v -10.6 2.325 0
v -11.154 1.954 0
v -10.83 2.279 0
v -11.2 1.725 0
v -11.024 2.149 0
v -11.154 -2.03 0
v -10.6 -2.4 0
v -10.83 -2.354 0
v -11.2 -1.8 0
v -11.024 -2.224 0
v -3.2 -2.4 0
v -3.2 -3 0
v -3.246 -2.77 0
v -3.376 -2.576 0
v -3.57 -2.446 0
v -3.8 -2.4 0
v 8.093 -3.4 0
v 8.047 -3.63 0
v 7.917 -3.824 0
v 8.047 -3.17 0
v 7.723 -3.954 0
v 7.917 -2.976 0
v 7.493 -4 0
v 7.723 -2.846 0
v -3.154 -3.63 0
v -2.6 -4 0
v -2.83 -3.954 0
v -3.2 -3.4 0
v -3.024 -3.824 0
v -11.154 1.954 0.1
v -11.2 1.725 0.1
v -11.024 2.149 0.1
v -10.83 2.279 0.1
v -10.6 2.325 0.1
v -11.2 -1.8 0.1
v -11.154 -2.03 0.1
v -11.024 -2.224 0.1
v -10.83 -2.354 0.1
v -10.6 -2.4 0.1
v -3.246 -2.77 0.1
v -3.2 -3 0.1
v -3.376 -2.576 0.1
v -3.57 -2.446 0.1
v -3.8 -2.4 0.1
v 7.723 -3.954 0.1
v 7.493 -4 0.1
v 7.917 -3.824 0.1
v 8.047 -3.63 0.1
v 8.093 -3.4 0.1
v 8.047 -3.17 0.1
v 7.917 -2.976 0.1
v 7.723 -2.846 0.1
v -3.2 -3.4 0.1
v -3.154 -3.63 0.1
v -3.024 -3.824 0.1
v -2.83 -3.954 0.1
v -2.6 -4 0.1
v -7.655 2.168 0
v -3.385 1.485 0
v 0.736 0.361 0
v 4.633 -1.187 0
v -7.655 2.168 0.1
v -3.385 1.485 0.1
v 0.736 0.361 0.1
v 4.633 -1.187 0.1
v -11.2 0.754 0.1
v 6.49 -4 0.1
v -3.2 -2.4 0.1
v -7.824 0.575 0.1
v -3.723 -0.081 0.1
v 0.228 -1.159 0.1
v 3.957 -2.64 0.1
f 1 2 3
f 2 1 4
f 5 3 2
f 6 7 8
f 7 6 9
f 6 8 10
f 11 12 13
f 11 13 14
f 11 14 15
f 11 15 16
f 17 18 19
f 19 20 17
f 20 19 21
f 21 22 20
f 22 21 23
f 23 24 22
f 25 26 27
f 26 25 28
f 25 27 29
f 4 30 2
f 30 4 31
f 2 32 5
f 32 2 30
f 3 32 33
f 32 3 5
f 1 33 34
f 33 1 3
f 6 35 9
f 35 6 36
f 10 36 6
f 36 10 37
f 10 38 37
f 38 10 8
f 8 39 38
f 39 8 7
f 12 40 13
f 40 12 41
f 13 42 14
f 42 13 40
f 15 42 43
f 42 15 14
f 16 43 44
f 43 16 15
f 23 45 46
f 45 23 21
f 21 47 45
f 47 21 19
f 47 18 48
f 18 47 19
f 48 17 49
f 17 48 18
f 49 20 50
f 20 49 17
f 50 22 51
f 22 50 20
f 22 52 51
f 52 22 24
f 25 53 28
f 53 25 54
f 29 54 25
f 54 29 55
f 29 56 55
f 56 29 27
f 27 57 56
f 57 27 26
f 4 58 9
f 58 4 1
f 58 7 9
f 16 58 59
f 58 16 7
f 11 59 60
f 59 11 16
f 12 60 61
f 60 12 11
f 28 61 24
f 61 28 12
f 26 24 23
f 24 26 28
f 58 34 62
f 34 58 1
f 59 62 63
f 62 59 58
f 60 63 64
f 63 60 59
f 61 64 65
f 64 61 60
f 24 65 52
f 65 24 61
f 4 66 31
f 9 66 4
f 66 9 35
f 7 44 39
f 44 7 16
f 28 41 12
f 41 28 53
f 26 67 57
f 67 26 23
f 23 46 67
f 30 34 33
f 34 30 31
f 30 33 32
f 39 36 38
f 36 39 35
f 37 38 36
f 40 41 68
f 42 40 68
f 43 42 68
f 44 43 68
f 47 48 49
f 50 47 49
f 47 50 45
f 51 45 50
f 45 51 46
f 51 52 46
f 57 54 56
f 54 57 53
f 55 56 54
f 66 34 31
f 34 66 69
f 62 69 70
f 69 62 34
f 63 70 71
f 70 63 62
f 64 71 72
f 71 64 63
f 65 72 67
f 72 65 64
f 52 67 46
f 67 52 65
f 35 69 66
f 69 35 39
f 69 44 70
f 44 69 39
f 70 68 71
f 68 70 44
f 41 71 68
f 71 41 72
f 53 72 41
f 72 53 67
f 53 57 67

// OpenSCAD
// file: ../p/7-16cyli.scad
use <../lib.scad>
function ldraw_lib__7_16cyli() = [
// 0 Cylinder 0.4375
// 0 Name: 7-16cyli.dat
// 0 Author: Magnus Forsberg [MagFors]
// 0 !LDRAW_ORG Primitive UPDATE 2024-01
// 0 !LICENSE Licensed under CC BY 4.0 : see CAreadme.txt
// 
// 0 BFC CERTIFY CCW
  [0,"BFC","CERTIFY"],
  [0,"BFC","CCW"],
// 
// 0 !HISTORY 2009-05-02 [PTadmin] Official Update 2009-01
// 0 !HISTORY 2024-01-03 [MagFors] Complete regeneration, original by guyvivan
// 0 !HISTORY 2024-01-29 [OrionP] Official Update 2024-01
// 
// 4 16 0.9239 0 0.3827 1 0 0 1 1 0 0.9239 1 0.3827
  [4,16,0.9239,0,0.3827,1,0,0,1,1,0,0.9239,1,0.3827],
// 4 16 0.7071 0 0.7071 0.9239 0 0.3827 0.9239 1 0.3827 0.7071 1 0.7071
  [4,16,0.7071,0,0.7071,0.9239,0,0.3827,0.9239,1,0.3827,0.7071,1,0.7071],
// 4 16 0.3827 0 0.9239 0.7071 0 0.7071 0.7071 1 0.7071 0.3827 1 0.9239
  [4,16,0.3827,0,0.9239,0.7071,0,0.7071,0.7071,1,0.7071,0.3827,1,0.9239],
// 4 16 0 0 1 0.3827 0 0.9239 0.3827 1 0.9239 0 1 1
  [4,16,0,0,1,0.3827,0,0.9239,0.3827,1,0.9239,0,1,1],
// 4 16 -0.3827 0 0.9239 0 0 1 0 1 1 -0.3827 1 0.9239
  [4,16,-0.3827,0,0.9239,0,0,1,0,1,1,-0.3827,1,0.9239],
// 4 16 -0.7071 0 0.7071 -0.3827 0 0.9239 -0.3827 1 0.9239 -0.7071 1 0.7071
  [4,16,-0.7071,0,0.7071,-0.3827,0,0.9239,-0.3827,1,0.9239,-0.7071,1,0.7071],
// 4 16 -0.9239 0 0.3827 -0.7071 0 0.7071 -0.7071 1 0.7071 -0.9239 1 0.3827
  [4,16,-0.9239,0,0.3827,-0.7071,0,0.7071,-0.7071,1,0.7071,-0.9239,1,0.3827],
// 0 // conditional lines
// 5 24 1 1 0 1 0 0 1 1 -0.4142 0.9239 1 0.3827
  [5,24,1,1,0,1,0,0,1,1,-0.4142,0.9239,1,0.3827],
// 5 24 0.9239 1 0.3827 0.9239 0 0.3827 1 1 0 0.7071 1 0.7071
  [5,24,0.9239,1,0.3827,0.9239,0,0.3827,1,1,0,0.7071,1,0.7071],
// 5 24 0.7071 1 0.7071 0.7071 0 0.7071 0.9239 1 0.3827 0.3827 1 0.9239
  [5,24,0.7071,1,0.7071,0.7071,0,0.7071,0.9239,1,0.3827,0.3827,1,0.9239],
// 5 24 0.3827 1 0.9239 0.3827 0 0.9239 0.7071 1 0.7071 0 1 1
  [5,24,0.3827,1,0.9239,0.3827,0,0.9239,0.7071,1,0.7071,0,1,1],
// 5 24 0 1 1 0 0 1 0.3827 1 0.9239 -0.3827 1 0.9239
  [5,24,0,1,1,0,0,1,0.3827,1,0.9239,-0.3827,1,0.9239],
// 5 24 -0.3827 1 0.9239 -0.3827 0 0.9239 0 1 1 -0.7071 1 0.7071
  [5,24,-0.3827,1,0.9239,-0.3827,0,0.9239,0,1,1,-0.7071,1,0.7071],
// 5 24 -0.7071 1 0.7071 -0.7071 0 0.7071 -0.3827 1 0.9239 -0.9239 1 0.3827
  [5,24,-0.7071,1,0.7071,-0.7071,0,0.7071,-0.3827,1,0.9239,-0.9239,1,0.3827],
// 5 24 -0.9239 1 0.3827 -0.9239 0 0.3827 -0.7071 1 0.7071 -1.0824 1 0
  [5,24,-0.9239,1,0.3827,-0.9239,0,0.3827,-0.7071,1,0.7071,-1.0824,1,0],
// 0 // Build by LDPartEditor (PrimGen 2.X)
];
module ldraw_lib__7_16cyli(step=0, col=false, unit=2/5, alt=false, line=0.2, solid=!$preview)
    makepoly(ldraw_lib__7_16cyli(), step=step, col=col, unit=unit, alt=alt, line=line, solid=solid);
ldraw_lib__7_16cyli(line=0.2);
// file: ../p/1-4cyli.scad
use <../lib.scad>
function ldraw_lib__1_4cyli() = [
// 0 Cylinder 0.25
// 0 Name: 1-4cyli.dat
// 0 Author: James Jessiman
// 0 !LDRAW_ORG Primitive UPDATE 2012-01
// 0 !LICENSE Licensed under CC BY 4.0 : see CAreadme.txt
// 
// 0 BFC CERTIFY CCW
  [0,"BFC","CERTIFY"],
  [0,"BFC","CCW"],
// 
// 0 !HISTORY 2002-03-23 [sbliss] Added BFC statement.
// 0 !HISTORY 2002-04-25 [PTadmin] Official Update 2002-02
// 0 !HISTORY 2007-06-22 [PTadmin] Header formatted for Contributor Agreement
// 0 !HISTORY 2008-07-01 [PTadmin] Official Update 2008-01
// 0 !HISTORY 2012-02-16 [Philo] Changed to CCW
// 0 !HISTORY 2012-03-30 [PTadmin] Official Update 2012-01
// 
// 
// 4 16 1 1 0 0.9239 1 0.3827 0.9239 0 0.3827 1 0 0
  [4,16,1,1,0,0.9239,1,0.3827,0.9239,0,0.3827,1,0,0],
// 5 24 1 0 0 1 1 0 0.9239 0 0.3827 1 0 -1
  [5,24,1,0,0,1,1,0,0.9239,0,0.3827,1,0,-1],
// 4 16 0.9239 1 0.3827 0.7071 1 0.7071 0.7071 0 0.7071 0.9239 0 0.3827
  [4,16,0.9239,1,0.3827,0.7071,1,0.7071,0.7071,0,0.7071,0.9239,0,0.3827],
// 5 24 0.9239 0 0.3827 0.9239 1 0.3827 0.7071 0 0.7071 1 0 0
  [5,24,0.9239,0,0.3827,0.9239,1,0.3827,0.7071,0,0.7071,1,0,0],
// 4 16 0.7071 1 0.7071 0.3827 1 0.9239 0.3827 0 0.9239 0.7071 0 0.7071
  [4,16,0.7071,1,0.7071,0.3827,1,0.9239,0.3827,0,0.9239,0.7071,0,0.7071],
// 5 24 0.7071 0 0.7071 0.7071 1 0.7071 0.3827 0 0.9239 0.9239 0 0.3827
  [5,24,0.7071,0,0.7071,0.7071,1,0.7071,0.3827,0,0.9239,0.9239,0,0.3827],
// 4 16 0.3827 1 0.9239 0 1 1 0 0 1 0.3827 0 0.9239
  [4,16,0.3827,1,0.9239,0,1,1,0,0,1,0.3827,0,0.9239],
// 5 24 0.3827 0 0.9239 0.3827 1 0.9239 0 0 1 0.7071 0 0.7071
  [5,24,0.3827,0,0.9239,0.3827,1,0.9239,0,0,1,0.7071,0,0.7071],
// 5 24 0 0 1 0 1 1 0.3827 0 0.9239 -1 0 1
  [5,24,0,0,1,0,1,1,0.3827,0,0.9239,-1,0,1],
];
module ldraw_lib__1_4cyli(step=0, col=false, unit=2/5, alt=false, line=0.2, solid=!$preview)
    makepoly(ldraw_lib__1_4cyli(), step=step, col=col, unit=unit, alt=alt, line=line, solid=solid);
ldraw_lib__1_4cyli(line=0.2);
// file: ../p/7-16chrd.scad
use <../lib.scad>
function ldraw_lib__7_16chrd() = [
// 0 Chord 0.4375
// 0 Name: 7-16chrd.dat
// 0 Author: Willy Tschager [Holly-Wood]
// 0 !LDRAW_ORG Primitive UPDATE 2024-01
// 0 !LICENSE Licensed under CC BY 4.0 : see CAreadme.txt
// 
// 0 BFC CERTIFY CCW
  [0,"BFC","CERTIFY"],
  [0,"BFC","CCW"],
// 
// 0 !HISTORY 2009-12-29 [PTadmin] Official Update 2009-03
// 0 !HISTORY 2024-01-10 [Holly-Wood] Complete re-write, original by guyvivan
// 0 !HISTORY 2024-01-29 [OrionP] Official Update 2024-01
// 
// 4 16 -.7071 0 .7071 -.9239 0 .3827 1 0 0 .9239 0 .3827
  [4,16,-.7071,0,.7071,-.9239,0,.3827,1,0,0,.9239,0,.3827],
// 4 16 -.7071 0 .7071 .9239 0 .3827 .7071 0 .7071 -.3827 0 .9239
  [4,16,-.7071,0,.7071,.9239,0,.3827,.7071,0,.7071,-.3827,0,.9239],
// 4 16 -.3827 0 .9239 .7071 0 .7071 .3827 0 .9239 0 0 1
  [4,16,-.3827,0,.9239,.7071,0,.7071,.3827,0,.9239,0,0,1],
// 0 // Based on LDPartEditor (PrimGen 2.X)
];
module ldraw_lib__7_16chrd(step=0, col=false, unit=2/5, alt=false, line=0.2, solid=!$preview)
    makepoly(ldraw_lib__7_16chrd(), step=step, col=col, unit=unit, alt=alt, line=line, solid=solid);
ldraw_lib__7_16chrd(line=0.2);
// file: ../p/1-4ndis.scad
use <../lib.scad>
function ldraw_lib__1_4ndis() = [
// 0 Disc Negative 0.25
// 0 Name: 1-4ndis.dat
// 0 Author: James Jessiman
// 0 !LDRAW_ORG Primitive UPDATE 2012-01
// 0 !LICENSE Licensed under CC BY 4.0 : see CAreadme.txt
// 
// 0 BFC CERTIFY CCW
  [0,"BFC","CERTIFY"],
  [0,"BFC","CCW"],
// 
// 0 !HISTORY 2002-03-23 [sbliss] Added BFC Statement
// 0 !HISTORY 2002-04-25 [PTadmin] Official Update 2002-02
// 0 !HISTORY 2007-06-22 [PTadmin] Header formatted for Contributor Agreement
// 0 !HISTORY 2008-07-01 [PTadmin] Official Update 2008-01
// 0 !HISTORY 2012-02-16 [Philo] Changed to CCW
// 0 !HISTORY 2012-03-30 [PTadmin] Official Update 2012-01
// 
// 
// 3 16 0.9239 0 0.3827 1 0 0 1 0 1
  [3,16,0.9239,0,0.3827,1,0,0,1,0,1],
// 3 16 0.7071 0 0.7071 0.9239 0 0.3827 1 0 1
  [3,16,0.7071,0,0.7071,0.9239,0,0.3827,1,0,1],
// 3 16 0.3827 0 0.9239 0.7071 0 0.7071 1 0 1
  [3,16,0.3827,0,0.9239,0.7071,0,0.7071,1,0,1],
// 3 16 0 0 1 0.3827 0 0.9239 1 0 1
  [3,16,0,0,1,0.3827,0,0.9239,1,0,1],
];
module ldraw_lib__1_4ndis(step=0, col=false, unit=2/5, alt=false, line=0.2, solid=!$preview)
    makepoly(ldraw_lib__1_4ndis(), step=step, col=col, unit=unit, alt=alt, line=line, solid=solid);
ldraw_lib__1_4ndis(line=0.2);
// file: ../p/1-4chrd.scad
use <../lib.scad>
function ldraw_lib__1_4chrd() = [
// 0 Chord 0.25
// 0 Name: 1-4chrd.dat
// 0 Author: Max Martin Richter [MMR1988]
// 0 !LDRAW_ORG Primitive UPDATE 2023-05
// 0 !LICENSE Licensed under CC BY 4.0 : see CAreadme.txt
// 
// 0 BFC CERTIFY CCW
  [0,"BFC","CERTIFY"],
  [0,"BFC","CCW"],
// 
// 0 !HISTORY 2004-04-22 [PTadmin] Official Update 2004-02
// 0 !HISTORY 2007-10-09 [PTadmin] Header formatted for Contributor Agreement
// 0 !HISTORY 2008-07-01 [PTadmin] Official Update 2008-01
// 0 !HISTORY 2012-08-02 [MMR1988] Re-creation with PrimGen2 and Rectifier
// 0 !HISTORY 2012-08-09 [PTadmin] Official Update 2012-02
// 0 !HISTORY 2023-10-27 [OrionP] Change author to MMR1988 from hafhead
// 0 !HISTORY 2023-10-31 [OrionP] Official Update 2023-05
// 
// 4 16 0.9239 0 0.3827 0.3827 0 0.9239 0 0 1 1 0 0
  [4,16,0.9239,0,0.3827,0.3827,0,0.9239,0,0,1,1,0,0],
// 3 16 0.7071 0 0.7071 0.3827 0 0.9239 0.9239 0 0.3827
  [3,16,0.7071,0,0.7071,0.3827,0,0.9239,0.9239,0,0.3827],
];
module ldraw_lib__1_4chrd(step=0, col=false, unit=2/5, alt=false, line=0.2, solid=!$preview)
    makepoly(ldraw_lib__1_4chrd(), step=step, col=col, unit=unit, alt=alt, line=line, solid=solid);
ldraw_lib__1_4chrd(line=0.2);
// file: s/stickerback008x024a.scad
use <../../lib.scad>
use <../../p/1-4chrd.scad>
use <../../p/1-4cyli.scad>
use <../../p/1-4ndis.scad>
use <../../p/7-16chrd.scad>
use <../../p/7-16cyli.scad>
function ldraw_lib__s__stickerback008x024a() = [
// 0 ~Sticker Back  0.8 x  2.4 for Side of Slope Brick Curved  3 x  1
// 0 Name: s\stickerback008x024a.dat
// 0 Author: Massimo Maso [Sirio]
// 0 !LDRAW_ORG Subpart UPDATE 2026-05
// 0 !LICENSE Licensed under CC BY 4.0 : see CAreadme.txt
// 
// 0 !HELP This is a stickerback, but it doesn't cover all the side of the 50950
// 
// 0 BFC CERTIFY CCW
  [0,"BFC","CERTIFY"],
  [0,"BFC","CCW"],
// 
// 0 !HISTORY 2026-05-31 [OrionP] Official Update 2026-05
// 
// 0 // Primitives
// 1 16 -26.5 0 4.3116 -1.5 0 0 0 -1 0 0 0 1.5 1-4chrd.dat
  [1,16,-26.5,0,4.3116,-1.5,0,0,0,-1,0,0,0,1.5, ldraw_lib__1_4chrd()],
// 1 16 -26.5 0 -4.5 -1.5 0 0 0 -1 0 0 0 -1.5 1-4chrd.dat
  [1,16,-26.5,0,-4.5,-1.5,0,0,0,-1,0,0,0,-1.5, ldraw_lib__1_4chrd()],
// 1 16 -9.5 0 -7.5 1.5 0 0 0 -1 0 0 0 1.5 1-4ndis.dat
  [1,16,-9.5,0,-7.5,1.5,0,0,0,-1,0,0,0,1.5, ldraw_lib__1_4ndis()],
// 1 16 18.7325 0 -8.5 0 0 1.5 0 -1 0 -1.5 0 0 7-16chrd.dat
  [1,16,18.7325,0,-8.5,0,0,1.5,0,-1,0,-1.5,0,0, ldraw_lib__7_16chrd()],
// 1 16 -6.5 0 -8.5 -1.5 0 0 0 -1 0 0 0 -1.5 1-4chrd.dat
  [1,16,-6.5,0,-8.5,-1.5,0,0,0,-1,0,0,0,-1.5, ldraw_lib__1_4chrd()],
// 1 16 -26.5 0 4.3116 -1.5 0 0 0 -.25 0 0 0 1.5 1-4cyli.dat
  [1,16,-26.5,0,4.3116,-1.5,0,0,0,-.25,0,0,0,1.5, ldraw_lib__1_4cyli()],
// 1 16 -26.5 0 -4.5 -1.5 0 0 0 -.25 0 0 0 -1.5 1-4cyli.dat
  [1,16,-26.5,0,-4.5,-1.5,0,0,0,-.25,0,0,0,-1.5, ldraw_lib__1_4cyli()],
// 0 BFC INVERTNEXT
  [0,"BFC","INVERTNEXT"],
// 1 16 -9.5 0 -7.5 1.5 0 0 0 -.25 0 0 0 1.5 1-4cyli.dat
  [1,16,-9.5,0,-7.5,1.5,0,0,0,-.25,0,0,0,1.5, ldraw_lib__1_4cyli()],
// 1 16 18.7325 0 -8.5 0 0 1.5 0 -.25 0 -1.5 0 0 7-16cyli.dat
  [1,16,18.7325,0,-8.5,0,0,1.5,0,-.25,0,-1.5,0,0, ldraw_lib__7_16cyli()],
// 1 16 -6.5 0 -8.5 -1.5 0 0 0 -.25 0 0 0 -1.5 1-4cyli.dat
  [1,16,-6.5,0,-8.5,-1.5,0,0,0,-.25,0,0,0,-1.5, ldraw_lib__1_4cyli()],
// 0 // Bottom faces
// 4 16 -19.1381 0 5.4212 -28 0 -4.5 -28 0 4.3116 -26.5 0 5.8116
  [4,16,-19.1381,0,5.4212,-28,0,-4.5,-28,0,4.3116,-26.5,0,5.8116],
// 3 16 -19.1381 0 5.4212 -26.5 0 -6 -28 0 -4.5
  [3,16,-19.1381,0,5.4212,-26.5,0,-6,-28,0,-4.5],
// 4 16 -19.1381 0 5.4212 -8.4622 0 3.7137 -9.5 0 -6 -26.5 0 -6
  [4,16,-19.1381,0,5.4212,-8.4622,0,3.7137,-9.5,0,-6,-26.5,0,-6],
// 4 16 1.8392 0 .9037 -8 0 -6 -9.5 0 -6 -8.4622 0 3.7137
  [4,16,1.8392,0,.9037,-8,0,-6,-9.5,0,-6,-8.4622,0,3.7137],
// 4 16 1.8392 0 .9037 11.5818 0 -2.9663 -8 0 -7.5 -8 0 -6
  [4,16,1.8392,0,.9037,11.5818,0,-2.9663,-8,0,-7.5,-8,0,-6],
// 4 16 -8 0 -8.5 -8 0 -7.5 11.5818 0 -2.9663 19.30655 0 -7.11415
  [4,16,-8,0,-8.5,-8,0,-7.5,11.5818,0,-2.9663,19.30655,0,-7.11415],
// 4 16 -8 0 -8.5 19.30655 0 -7.11415 18.7325 0 -10 -6.5 0 -10
  [4,16,-8,0,-8.5,19.30655,0,-7.11415,18.7325,0,-10,-6.5,0,-10],
// 0 // Lateral faces
// 4 16 -19.1381 0 5.4212 -26.5 0 5.8116 -26.5 -.25 5.8116 -19.1381 -.25 5.4212
  [4,16,-19.1381,0,5.4212,-26.5,0,5.8116,-26.5,-.25,5.8116,-19.1381,-.25,5.4212],
// 4 16 -19.1381 0 5.4212 -19.1381 -.25 5.4212 -8.4622 -.25 3.7137 -8.4622 0 3.7137
  [4,16,-19.1381,0,5.4212,-19.1381,-.25,5.4212,-8.4622,-.25,3.7137,-8.4622,0,3.7137],
// 4 16 1.8392 0 .9037 -8.4622 0 3.7137 -8.4622 -.25 3.7137 1.8392 -.25 .9037
  [4,16,1.8392,0,.9037,-8.4622,0,3.7137,-8.4622,-.25,3.7137,1.8392,-.25,.9037],
// 4 16 1.8392 0 .9037 1.8392 -.25 .9037 11.5818 -.25 -2.9663 11.5818 0 -2.9663
  [4,16,1.8392,0,.9037,1.8392,-.25,.9037,11.5818,-.25,-2.9663,11.5818,0,-2.9663],
// 4 16 19.30655 0 -7.11415 11.5818 0 -2.9663 11.5818 -.25 -2.9663 19.30655 -.25 -7.11415
  [4,16,19.30655,0,-7.11415,11.5818,0,-2.9663,11.5818,-.25,-2.9663,19.30655,-.25,-7.11415],
// 3 16 -28 0 4.3116 -28 -.25 1.8855 -28 -.25 4.3116
  [3,16,-28,0,4.3116,-28,-.25,1.8855,-28,-.25,4.3116],
// 4 16 -28 0 4.3116 -28 0 -4.5 -28 -.25 -4.5 -28 -.25 1.8855
  [4,16,-28,0,4.3116,-28,0,-4.5,-28,-.25,-4.5,-28,-.25,1.8855],
// 4 16 -26.5 0 -6 -9.5 0 -6 -9.5 -.25 -6 -26.5 -.25 -6
  [4,16,-26.5,0,-6,-9.5,0,-6,-9.5,-.25,-6,-26.5,-.25,-6],
// 4 16 -8 0 -7.5 -8 0 -8.5 -8 -.25 -8.5 -8 -.25 -7.5
  [4,16,-8,0,-7.5,-8,0,-8.5,-8,-.25,-8.5,-8,-.25,-7.5],
// 4 16 18.7325 0 -10 16.2256 -.25 -10 -6.5 -.25 -10 -6.5 0 -10
  [4,16,18.7325,0,-10,16.2256,-.25,-10,-6.5,-.25,-10,-6.5,0,-10],
// 3 16 18.7325 0 -10 18.7325 -.25 -10 16.2256 -.25 -10
  [3,16,18.7325,0,-10,18.7325,-.25,-10,16.2256,-.25,-10],
// 0 // Conditional lines
// 5 24 -26.5 0 5.8116 -26.5 -.25 5.8116 -19.1381 0 5.4212 -27.07405 0 5.69745
  [5,24,-26.5,0,5.8116,-26.5,-.25,5.8116,-19.1381,0,5.4212,-27.07405,0,5.69745],
// 5 24 -19.1381 0 5.4212 -19.1381 -.25 5.4212 -8.4622 0 3.7137 -26.5 0 5.8116
  [5,24,-19.1381,0,5.4212,-19.1381,-.25,5.4212,-8.4622,0,3.7137,-26.5,0,5.8116],
// 5 24 -8.4622 0 3.7137 -8.4622 -.25 3.7137 1.8392 0 .9037 -19.1381 0 5.4212
  [5,24,-8.4622,0,3.7137,-8.4622,-.25,3.7137,1.8392,0,.9037,-19.1381,0,5.4212],
// 5 24 1.8392 0 .9037 1.8392 -.25 .9037 11.5818 0 -2.9663 -8.4622 0 3.7137
  [5,24,1.8392,0,.9037,1.8392,-.25,.9037,11.5818,0,-2.9663,-8.4622,0,3.7137],
// 5 24 11.5818 0 -2.9663 11.5818 -.25 -2.9663 19.30655 0 -7.11415 1.8392 0 .9037
  [5,24,11.5818,0,-2.9663,11.5818,-.25,-2.9663,19.30655,0,-7.11415,1.8392,0,.9037],
// 5 24 19.30655 0 -7.11415 19.30655 -.25 -7.11415 19.79315 0 -7.43935 11.5818 0 -2.9663
  [5,24,19.30655,0,-7.11415,19.30655,-.25,-7.11415,19.79315,0,-7.43935,11.5818,0,-2.9663],
];
module ldraw_lib__s__stickerback008x024a(step=0, col=false, unit=2/5, alt=false, line=0.2, solid=!$preview)
    makepoly(ldraw_lib__s__stickerback008x024a(), step=step, col=col, unit=unit, alt=alt, line=line, solid=solid);
ldraw_lib__s__stickerback008x024a(line=0.2);
// file: s/6221655ads02.scad
use <../../lib.scad>
use <../../p/1-4chrd.scad>
use <../../p/1-4ndis.scad>
use <../../p/7-16chrd.scad>
function ldraw_lib__s__6221655ads02() = [
// 0 ~Sticker  0.8 x  2.4 with Black Curved Stripe on Lime Background Right - Top Face
// 0 Name: s\6221655ads02.dat
// 0 Author: Massimo Maso [Sirio]
// 0 !LDRAW_ORG Subpart UPDATE 2026-05
// 0 !LICENSE Licensed under CC BY 4.0 : see CAreadme.txt
// 
// 0 !HELP Stickers' geometry in common with set 75895 (sheet 6285381)
// 
// 0 BFC CERTIFY CCW
  [0,"BFC","CERTIFY"],
  [0,"BFC","CCW"],
// 
// 0 !HISTORY 2024-10-27 [OrionP] Official Update 2024-09
// 0 !HISTORY 2025-11-17 [Sirio] Adapted to new 50950 geometry
// 0 !HISTORY 2026-05-31 [OrionP] Official Update 2026-05
// 
// 0 // Primitives
// 1 0 -26.5 -.25 4.3116 -1.5 0 0 0 1 0 0 0 1.5 1-4chrd.dat
  [1,0,-26.5,-.25,4.3116,-1.5,0,0,0,1,0,0,0,1.5, ldraw_lib__1_4chrd()],
// 1 16 -26.5 -.25 -4.5 -1.5 0 0 0 1 0 0 0 -1.5 1-4chrd.dat
  [1,16,-26.5,-.25,-4.5,-1.5,0,0,0,1,0,0,0,-1.5, ldraw_lib__1_4chrd()],
// 1 16 -9.5 -.25 -7.5 1.5 0 0 0 1 0 0 0 1.5 1-4ndis.dat
  [1,16,-9.5,-.25,-7.5,1.5,0,0,0,1,0,0,0,1.5, ldraw_lib__1_4ndis()],
// 1 0 18.7325 -.25 -8.5 0 0 1.5 0 1 0 -1.5 0 0 7-16chrd.dat
  [1,0,18.7325,-.25,-8.5,0,0,1.5,0,1,0,-1.5,0,0, ldraw_lib__7_16chrd()],
// 1 16 -6.5 -.25 -8.5 -1.5 0 0 0 1 0 0 0 -1.5 1-4chrd.dat
  [1,16,-6.5,-.25,-8.5,-1.5,0,0,0,1,0,0,0,-1.5, ldraw_lib__1_4chrd()],
// 0 // Black faces
// 4 0 -19.5611 -.25 1.438 -26.5 -.25 5.8116 -28 -.25 4.3116 -28 -.25 1.8855
  [4,0,-19.5611,-.25,1.438,-26.5,-.25,5.8116,-28,-.25,4.3116,-28,-.25,1.8855],
// 4 0 -19.5611 -.25 1.438 -9.3068 -.25 -.202 -19.1381 -.25 5.4212 -26.5 -.25 5.8116
  [4,0,-19.5611,-.25,1.438,-9.3068,-.25,-.202,-19.1381,-.25,5.4212,-26.5,-.25,5.8116],
// 4 0 .5706 -.25 -2.8964 -8.4622 -.25 3.7137 -19.1381 -.25 5.4212 -9.3068 -.25 -.202
  [4,0,.5706,-.25,-2.8964,-8.4622,-.25,3.7137,-19.1381,-.25,5.4212,-9.3068,-.25,-.202],
// 4 0 .5706 -.25 -2.8964 9.8918 -.25 -6.599 1.8392 -.25 .9037 -8.4622 -.25 3.7137
  [4,0,.5706,-.25,-2.8964,9.8918,-.25,-6.599,1.8392,-.25,.9037,-8.4622,-.25,3.7137],
// 4 0 16.2256 -.25 -10 11.5818 -.25 -2.9663 1.8392 -.25 .9037 9.8918 -.25 -6.599
  [4,0,16.2256,-.25,-10,11.5818,-.25,-2.9663,1.8392,-.25,.9037,9.8918,-.25,-6.599],
// 4 0 16.2256 -.25 -10 18.7325 -.25 -10 19.30655 -.25 -7.11415 11.5818 -.25 -2.9663
  [4,0,16.2256,-.25,-10,18.7325,-.25,-10,19.30655,-.25,-7.11415,11.5818,-.25,-2.9663],
// 0 // Green faces
// 4 16 -26.5 -.25 -6 -19.5611 -.25 1.438 -28 -.25 1.8855 -28 -.25 -4.5
  [4,16,-26.5,-.25,-6,-19.5611,-.25,1.438,-28,-.25,1.8855,-28,-.25,-4.5],
// 4 16 -26.5 -.25 -6 -9.5 -.25 -6 -9.3068 -.25 -.202 -19.5611 -.25 1.438
  [4,16,-26.5,-.25,-6,-9.5,-.25,-6,-9.3068,-.25,-.202,-19.5611,-.25,1.438],
// 4 16 -8 -.25 -6 .5706 -.25 -2.8964 -9.3068 -.25 -.202 -9.5 -.25 -6
  [4,16,-8,-.25,-6,.5706,-.25,-2.8964,-9.3068,-.25,-.202,-9.5,-.25,-6],
// 4 16 -8 -.25 -6 -8 -.25 -7.5 9.8918 -.25 -6.599 .5706 -.25 -2.8964
  [4,16,-8,-.25,-6,-8,-.25,-7.5,9.8918,-.25,-6.599,.5706,-.25,-2.8964],
// 4 16 -8 -.25 -8.5 16.2256 -.25 -10 9.8918 -.25 -6.599 -8 -.25 -7.5
  [4,16,-8,-.25,-8.5,16.2256,-.25,-10,9.8918,-.25,-6.599,-8,-.25,-7.5],
// 3 16 -8 -.25 -8.5 -6.5 -.25 -10 16.2256 -.25 -10
  [3,16,-8,-.25,-8.5,-6.5,-.25,-10,16.2256,-.25,-10],
];
module ldraw_lib__s__6221655ads02(step=0, col=false, unit=2/5, alt=false, line=0.2, solid=!$preview)
    makepoly(ldraw_lib__s__6221655ads02(), step=step, col=col, unit=unit, alt=alt, line=line, solid=solid);
ldraw_lib__s__6221655ads02(line=0.2);
// main file
use <../lib.scad>
use <s/6221655ads02.scad>
use <s/stickerback008x024a.scad>
function ldraw_lib__6285381g() = [
// 0 Sticker  0.8 x  2.4 with Black Curved Stripe on Transparent Background Right
// 0 Name: 6285381g.dat
// 0 Author: Magnus Forsberg [MagFors]
// 0 !LDRAW_ORG Part UPDATE 2026-05
// 0 !LICENSE Licensed under CC BY 4.0 : see CAreadme.txt
// 
// 0 BFC CERTIFY CCW
  [0,"BFC","CERTIFY"],
  [0,"BFC","CCW"],
// 
// 0 !KEYWORDS 911, Bricklink 75895stk01, Brickowl 178456, bumper, front, Porsche
// 0 !KEYWORDS Rebrickable 65827, set 75895
// 
// 0 !HISTORY 2022-12-20 [PTadmin] Official Update 2022-06
// 0 !HISTORY 2025-11-14 [Sirio] Modified for changes in 50950; introduced stickerback; changed description; make geometry in common with set 75888
// 0 !HISTORY 2026-05-31 [OrionP] Official Update 2026-05
// 
// 1 16 0 0 0 1 0 0 0 1 0 0 0 1 s\stickerback008x024a.dat
  [1,16,0,0,0,1,0,0,0,1,0,0,0,1, ldraw_lib__s__stickerback008x024a()],
// 1 16 0 0 0 1 0 0 0 1 0 0 0 1 s\6221655ads02.dat
  [1,16,0,0,0,1,0,0,0,1,0,0,0,1, ldraw_lib__s__6221655ads02()],
];
module ldraw_lib__6285381g(step=0, col=false, unit=2/5, alt=false, line=0.2, solid=!$preview)
    makepoly(ldraw_lib__6285381g(), step=step, col=col, unit=unit, alt=alt, line=line, solid=solid);
ldraw_lib__6285381g(line=0.2);
